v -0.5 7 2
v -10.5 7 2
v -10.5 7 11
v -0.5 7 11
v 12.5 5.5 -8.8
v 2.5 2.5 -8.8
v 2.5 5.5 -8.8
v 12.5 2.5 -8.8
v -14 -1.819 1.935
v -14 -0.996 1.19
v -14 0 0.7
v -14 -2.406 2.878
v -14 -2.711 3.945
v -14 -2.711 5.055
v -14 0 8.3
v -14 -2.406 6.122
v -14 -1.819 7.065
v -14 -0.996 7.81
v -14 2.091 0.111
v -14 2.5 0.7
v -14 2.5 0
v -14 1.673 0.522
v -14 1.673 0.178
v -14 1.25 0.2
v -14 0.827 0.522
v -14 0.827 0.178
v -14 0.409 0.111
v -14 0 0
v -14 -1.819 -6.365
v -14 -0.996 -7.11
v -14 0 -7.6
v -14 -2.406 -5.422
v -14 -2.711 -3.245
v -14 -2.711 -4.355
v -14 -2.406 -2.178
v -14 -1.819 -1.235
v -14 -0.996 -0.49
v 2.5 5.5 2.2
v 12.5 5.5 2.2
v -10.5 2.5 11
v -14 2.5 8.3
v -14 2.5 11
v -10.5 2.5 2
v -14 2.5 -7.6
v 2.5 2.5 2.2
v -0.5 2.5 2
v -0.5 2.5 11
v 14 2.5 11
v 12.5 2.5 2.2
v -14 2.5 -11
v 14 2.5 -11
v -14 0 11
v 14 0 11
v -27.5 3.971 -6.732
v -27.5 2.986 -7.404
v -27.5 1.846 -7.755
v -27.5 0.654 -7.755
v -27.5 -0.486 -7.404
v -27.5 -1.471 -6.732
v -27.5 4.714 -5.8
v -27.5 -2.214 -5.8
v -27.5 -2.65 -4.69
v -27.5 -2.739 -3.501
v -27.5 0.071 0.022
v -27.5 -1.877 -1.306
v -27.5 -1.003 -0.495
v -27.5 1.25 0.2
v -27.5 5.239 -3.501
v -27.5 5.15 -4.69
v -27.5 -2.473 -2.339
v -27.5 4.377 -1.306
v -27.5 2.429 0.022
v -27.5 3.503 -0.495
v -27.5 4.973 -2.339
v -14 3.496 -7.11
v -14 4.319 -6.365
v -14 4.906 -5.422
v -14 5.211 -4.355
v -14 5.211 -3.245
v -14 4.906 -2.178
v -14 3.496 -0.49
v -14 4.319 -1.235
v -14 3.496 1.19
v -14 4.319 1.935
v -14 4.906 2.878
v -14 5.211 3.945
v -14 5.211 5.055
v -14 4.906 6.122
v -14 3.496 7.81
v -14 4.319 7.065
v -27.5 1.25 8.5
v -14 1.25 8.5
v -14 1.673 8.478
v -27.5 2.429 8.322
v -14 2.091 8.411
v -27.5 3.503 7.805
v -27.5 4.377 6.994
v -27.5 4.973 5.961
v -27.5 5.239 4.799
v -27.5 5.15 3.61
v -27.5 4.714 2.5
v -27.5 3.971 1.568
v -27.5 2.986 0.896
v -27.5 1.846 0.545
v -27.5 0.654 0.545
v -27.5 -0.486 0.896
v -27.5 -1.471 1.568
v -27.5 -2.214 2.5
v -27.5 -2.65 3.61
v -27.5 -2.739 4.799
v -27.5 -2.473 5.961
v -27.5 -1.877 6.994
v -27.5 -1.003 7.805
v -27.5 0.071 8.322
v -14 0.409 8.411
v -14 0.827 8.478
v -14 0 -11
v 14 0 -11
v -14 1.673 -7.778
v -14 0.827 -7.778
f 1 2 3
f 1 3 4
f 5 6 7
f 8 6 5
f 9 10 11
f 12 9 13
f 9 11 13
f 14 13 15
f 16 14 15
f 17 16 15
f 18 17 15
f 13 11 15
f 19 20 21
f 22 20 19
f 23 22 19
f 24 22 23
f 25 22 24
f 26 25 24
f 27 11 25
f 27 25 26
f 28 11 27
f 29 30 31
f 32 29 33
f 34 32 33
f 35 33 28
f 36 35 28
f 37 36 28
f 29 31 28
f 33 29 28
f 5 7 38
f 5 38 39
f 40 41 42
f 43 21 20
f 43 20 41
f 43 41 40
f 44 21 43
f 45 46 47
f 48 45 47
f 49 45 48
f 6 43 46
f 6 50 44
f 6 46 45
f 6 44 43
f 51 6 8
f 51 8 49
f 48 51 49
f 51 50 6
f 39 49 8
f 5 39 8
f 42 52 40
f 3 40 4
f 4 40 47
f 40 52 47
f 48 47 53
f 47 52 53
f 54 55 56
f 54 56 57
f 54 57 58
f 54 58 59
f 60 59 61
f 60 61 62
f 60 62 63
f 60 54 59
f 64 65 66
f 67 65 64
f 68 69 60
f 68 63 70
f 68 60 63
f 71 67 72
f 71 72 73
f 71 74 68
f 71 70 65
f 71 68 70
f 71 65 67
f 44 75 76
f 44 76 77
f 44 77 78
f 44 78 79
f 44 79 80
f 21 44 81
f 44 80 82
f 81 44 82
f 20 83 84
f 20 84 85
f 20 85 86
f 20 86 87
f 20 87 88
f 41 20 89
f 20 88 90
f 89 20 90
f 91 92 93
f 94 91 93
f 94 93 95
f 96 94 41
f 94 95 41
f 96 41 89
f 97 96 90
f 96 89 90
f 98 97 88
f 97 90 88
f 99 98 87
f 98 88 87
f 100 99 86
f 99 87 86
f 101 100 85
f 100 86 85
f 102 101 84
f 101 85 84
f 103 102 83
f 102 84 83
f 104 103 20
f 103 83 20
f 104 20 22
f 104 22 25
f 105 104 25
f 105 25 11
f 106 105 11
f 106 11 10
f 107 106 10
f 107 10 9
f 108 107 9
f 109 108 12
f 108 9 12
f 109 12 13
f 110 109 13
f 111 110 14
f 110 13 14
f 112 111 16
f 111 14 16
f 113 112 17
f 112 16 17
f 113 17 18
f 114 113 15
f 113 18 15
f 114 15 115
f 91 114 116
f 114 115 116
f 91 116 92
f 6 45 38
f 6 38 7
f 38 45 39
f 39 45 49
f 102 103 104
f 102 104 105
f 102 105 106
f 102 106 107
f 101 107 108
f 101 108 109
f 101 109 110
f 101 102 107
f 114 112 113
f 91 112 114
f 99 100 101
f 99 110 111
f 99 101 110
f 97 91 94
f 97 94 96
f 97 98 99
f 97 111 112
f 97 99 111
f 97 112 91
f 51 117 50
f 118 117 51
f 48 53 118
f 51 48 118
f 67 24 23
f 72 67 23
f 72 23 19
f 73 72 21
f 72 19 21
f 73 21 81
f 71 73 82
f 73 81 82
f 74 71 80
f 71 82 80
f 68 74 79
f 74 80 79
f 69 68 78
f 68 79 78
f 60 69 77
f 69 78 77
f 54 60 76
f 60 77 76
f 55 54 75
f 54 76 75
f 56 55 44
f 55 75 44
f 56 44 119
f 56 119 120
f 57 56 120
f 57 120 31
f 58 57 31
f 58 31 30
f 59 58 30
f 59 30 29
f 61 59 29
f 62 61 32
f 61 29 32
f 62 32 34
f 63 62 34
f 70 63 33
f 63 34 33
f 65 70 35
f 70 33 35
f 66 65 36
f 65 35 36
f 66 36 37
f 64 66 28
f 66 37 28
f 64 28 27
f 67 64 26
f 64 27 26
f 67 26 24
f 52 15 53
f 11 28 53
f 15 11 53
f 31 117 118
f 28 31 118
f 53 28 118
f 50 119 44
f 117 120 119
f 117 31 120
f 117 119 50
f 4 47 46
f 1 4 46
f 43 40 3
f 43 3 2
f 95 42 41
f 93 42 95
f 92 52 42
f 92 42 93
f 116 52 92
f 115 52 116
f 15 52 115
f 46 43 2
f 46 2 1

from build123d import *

# Parameters (mm, degrees)
SKETCH1_W           = 28
SKETCH1_H           = 22
BOSS_EXTRUDE1_DEPTH = 2.5
SKETCH2_W           = 10
SKETCH2_H           = 9
BOSS_EXTRUDE2_DEPTH = 4.5
SKETCH3_W           = 10
SKETCH3_H           = 11
BOSS_EXTRUDE3_DEPTH = 3
SKETCH4_R           = 4
BOSS_EXTRUDE4_DEPTH = 13.5


with BuildPart() as part:
    # Sketch1 → Boss-Extrude1 (new body)
    with BuildSketch(Plane(origin=(0, 0, 0), x_dir=(1, 0, 0), z_dir=(0, 1, 0))):
        Rectangle(SKETCH1_W, SKETCH1_H)
    extrude(amount=BOSS_EXTRUDE1_DEPTH)

    # Sketch2 → Boss-Extrude2 (add)
    with BuildSketch(Plane(origin=(0, 2.5, 0), x_dir=(1, 0, 0), z_dir=(0, 1, 0))):
        with Locations((-5.5, -6.5)):
            Rectangle(SKETCH2_W, SKETCH2_H)
    extrude(amount=BOSS_EXTRUDE2_DEPTH)

    # Sketch3 → Boss-Extrude3 (add)
    with BuildSketch(Plane(origin=(0, 2.5, 0), x_dir=(1, 0, 0), z_dir=(0, 1, 0))):
        with Locations((7.5, 3.3)):
            Rectangle(SKETCH3_W, SKETCH3_H)
    extrude(amount=BOSS_EXTRUDE3_DEPTH)

    # Sketch4 → Boss-Extrude4 (add)
    with BuildSketch(Plane.ZY.offset(14)):
        with Locations((-3.8, 1.25)):
            Circle(SKETCH4_R)
        with Locations((4.5, 1.25)):
            Circle(SKETCH4_R)
    extrude(amount=BOSS_EXTRUDE4_DEPTH)


solid = part.part
